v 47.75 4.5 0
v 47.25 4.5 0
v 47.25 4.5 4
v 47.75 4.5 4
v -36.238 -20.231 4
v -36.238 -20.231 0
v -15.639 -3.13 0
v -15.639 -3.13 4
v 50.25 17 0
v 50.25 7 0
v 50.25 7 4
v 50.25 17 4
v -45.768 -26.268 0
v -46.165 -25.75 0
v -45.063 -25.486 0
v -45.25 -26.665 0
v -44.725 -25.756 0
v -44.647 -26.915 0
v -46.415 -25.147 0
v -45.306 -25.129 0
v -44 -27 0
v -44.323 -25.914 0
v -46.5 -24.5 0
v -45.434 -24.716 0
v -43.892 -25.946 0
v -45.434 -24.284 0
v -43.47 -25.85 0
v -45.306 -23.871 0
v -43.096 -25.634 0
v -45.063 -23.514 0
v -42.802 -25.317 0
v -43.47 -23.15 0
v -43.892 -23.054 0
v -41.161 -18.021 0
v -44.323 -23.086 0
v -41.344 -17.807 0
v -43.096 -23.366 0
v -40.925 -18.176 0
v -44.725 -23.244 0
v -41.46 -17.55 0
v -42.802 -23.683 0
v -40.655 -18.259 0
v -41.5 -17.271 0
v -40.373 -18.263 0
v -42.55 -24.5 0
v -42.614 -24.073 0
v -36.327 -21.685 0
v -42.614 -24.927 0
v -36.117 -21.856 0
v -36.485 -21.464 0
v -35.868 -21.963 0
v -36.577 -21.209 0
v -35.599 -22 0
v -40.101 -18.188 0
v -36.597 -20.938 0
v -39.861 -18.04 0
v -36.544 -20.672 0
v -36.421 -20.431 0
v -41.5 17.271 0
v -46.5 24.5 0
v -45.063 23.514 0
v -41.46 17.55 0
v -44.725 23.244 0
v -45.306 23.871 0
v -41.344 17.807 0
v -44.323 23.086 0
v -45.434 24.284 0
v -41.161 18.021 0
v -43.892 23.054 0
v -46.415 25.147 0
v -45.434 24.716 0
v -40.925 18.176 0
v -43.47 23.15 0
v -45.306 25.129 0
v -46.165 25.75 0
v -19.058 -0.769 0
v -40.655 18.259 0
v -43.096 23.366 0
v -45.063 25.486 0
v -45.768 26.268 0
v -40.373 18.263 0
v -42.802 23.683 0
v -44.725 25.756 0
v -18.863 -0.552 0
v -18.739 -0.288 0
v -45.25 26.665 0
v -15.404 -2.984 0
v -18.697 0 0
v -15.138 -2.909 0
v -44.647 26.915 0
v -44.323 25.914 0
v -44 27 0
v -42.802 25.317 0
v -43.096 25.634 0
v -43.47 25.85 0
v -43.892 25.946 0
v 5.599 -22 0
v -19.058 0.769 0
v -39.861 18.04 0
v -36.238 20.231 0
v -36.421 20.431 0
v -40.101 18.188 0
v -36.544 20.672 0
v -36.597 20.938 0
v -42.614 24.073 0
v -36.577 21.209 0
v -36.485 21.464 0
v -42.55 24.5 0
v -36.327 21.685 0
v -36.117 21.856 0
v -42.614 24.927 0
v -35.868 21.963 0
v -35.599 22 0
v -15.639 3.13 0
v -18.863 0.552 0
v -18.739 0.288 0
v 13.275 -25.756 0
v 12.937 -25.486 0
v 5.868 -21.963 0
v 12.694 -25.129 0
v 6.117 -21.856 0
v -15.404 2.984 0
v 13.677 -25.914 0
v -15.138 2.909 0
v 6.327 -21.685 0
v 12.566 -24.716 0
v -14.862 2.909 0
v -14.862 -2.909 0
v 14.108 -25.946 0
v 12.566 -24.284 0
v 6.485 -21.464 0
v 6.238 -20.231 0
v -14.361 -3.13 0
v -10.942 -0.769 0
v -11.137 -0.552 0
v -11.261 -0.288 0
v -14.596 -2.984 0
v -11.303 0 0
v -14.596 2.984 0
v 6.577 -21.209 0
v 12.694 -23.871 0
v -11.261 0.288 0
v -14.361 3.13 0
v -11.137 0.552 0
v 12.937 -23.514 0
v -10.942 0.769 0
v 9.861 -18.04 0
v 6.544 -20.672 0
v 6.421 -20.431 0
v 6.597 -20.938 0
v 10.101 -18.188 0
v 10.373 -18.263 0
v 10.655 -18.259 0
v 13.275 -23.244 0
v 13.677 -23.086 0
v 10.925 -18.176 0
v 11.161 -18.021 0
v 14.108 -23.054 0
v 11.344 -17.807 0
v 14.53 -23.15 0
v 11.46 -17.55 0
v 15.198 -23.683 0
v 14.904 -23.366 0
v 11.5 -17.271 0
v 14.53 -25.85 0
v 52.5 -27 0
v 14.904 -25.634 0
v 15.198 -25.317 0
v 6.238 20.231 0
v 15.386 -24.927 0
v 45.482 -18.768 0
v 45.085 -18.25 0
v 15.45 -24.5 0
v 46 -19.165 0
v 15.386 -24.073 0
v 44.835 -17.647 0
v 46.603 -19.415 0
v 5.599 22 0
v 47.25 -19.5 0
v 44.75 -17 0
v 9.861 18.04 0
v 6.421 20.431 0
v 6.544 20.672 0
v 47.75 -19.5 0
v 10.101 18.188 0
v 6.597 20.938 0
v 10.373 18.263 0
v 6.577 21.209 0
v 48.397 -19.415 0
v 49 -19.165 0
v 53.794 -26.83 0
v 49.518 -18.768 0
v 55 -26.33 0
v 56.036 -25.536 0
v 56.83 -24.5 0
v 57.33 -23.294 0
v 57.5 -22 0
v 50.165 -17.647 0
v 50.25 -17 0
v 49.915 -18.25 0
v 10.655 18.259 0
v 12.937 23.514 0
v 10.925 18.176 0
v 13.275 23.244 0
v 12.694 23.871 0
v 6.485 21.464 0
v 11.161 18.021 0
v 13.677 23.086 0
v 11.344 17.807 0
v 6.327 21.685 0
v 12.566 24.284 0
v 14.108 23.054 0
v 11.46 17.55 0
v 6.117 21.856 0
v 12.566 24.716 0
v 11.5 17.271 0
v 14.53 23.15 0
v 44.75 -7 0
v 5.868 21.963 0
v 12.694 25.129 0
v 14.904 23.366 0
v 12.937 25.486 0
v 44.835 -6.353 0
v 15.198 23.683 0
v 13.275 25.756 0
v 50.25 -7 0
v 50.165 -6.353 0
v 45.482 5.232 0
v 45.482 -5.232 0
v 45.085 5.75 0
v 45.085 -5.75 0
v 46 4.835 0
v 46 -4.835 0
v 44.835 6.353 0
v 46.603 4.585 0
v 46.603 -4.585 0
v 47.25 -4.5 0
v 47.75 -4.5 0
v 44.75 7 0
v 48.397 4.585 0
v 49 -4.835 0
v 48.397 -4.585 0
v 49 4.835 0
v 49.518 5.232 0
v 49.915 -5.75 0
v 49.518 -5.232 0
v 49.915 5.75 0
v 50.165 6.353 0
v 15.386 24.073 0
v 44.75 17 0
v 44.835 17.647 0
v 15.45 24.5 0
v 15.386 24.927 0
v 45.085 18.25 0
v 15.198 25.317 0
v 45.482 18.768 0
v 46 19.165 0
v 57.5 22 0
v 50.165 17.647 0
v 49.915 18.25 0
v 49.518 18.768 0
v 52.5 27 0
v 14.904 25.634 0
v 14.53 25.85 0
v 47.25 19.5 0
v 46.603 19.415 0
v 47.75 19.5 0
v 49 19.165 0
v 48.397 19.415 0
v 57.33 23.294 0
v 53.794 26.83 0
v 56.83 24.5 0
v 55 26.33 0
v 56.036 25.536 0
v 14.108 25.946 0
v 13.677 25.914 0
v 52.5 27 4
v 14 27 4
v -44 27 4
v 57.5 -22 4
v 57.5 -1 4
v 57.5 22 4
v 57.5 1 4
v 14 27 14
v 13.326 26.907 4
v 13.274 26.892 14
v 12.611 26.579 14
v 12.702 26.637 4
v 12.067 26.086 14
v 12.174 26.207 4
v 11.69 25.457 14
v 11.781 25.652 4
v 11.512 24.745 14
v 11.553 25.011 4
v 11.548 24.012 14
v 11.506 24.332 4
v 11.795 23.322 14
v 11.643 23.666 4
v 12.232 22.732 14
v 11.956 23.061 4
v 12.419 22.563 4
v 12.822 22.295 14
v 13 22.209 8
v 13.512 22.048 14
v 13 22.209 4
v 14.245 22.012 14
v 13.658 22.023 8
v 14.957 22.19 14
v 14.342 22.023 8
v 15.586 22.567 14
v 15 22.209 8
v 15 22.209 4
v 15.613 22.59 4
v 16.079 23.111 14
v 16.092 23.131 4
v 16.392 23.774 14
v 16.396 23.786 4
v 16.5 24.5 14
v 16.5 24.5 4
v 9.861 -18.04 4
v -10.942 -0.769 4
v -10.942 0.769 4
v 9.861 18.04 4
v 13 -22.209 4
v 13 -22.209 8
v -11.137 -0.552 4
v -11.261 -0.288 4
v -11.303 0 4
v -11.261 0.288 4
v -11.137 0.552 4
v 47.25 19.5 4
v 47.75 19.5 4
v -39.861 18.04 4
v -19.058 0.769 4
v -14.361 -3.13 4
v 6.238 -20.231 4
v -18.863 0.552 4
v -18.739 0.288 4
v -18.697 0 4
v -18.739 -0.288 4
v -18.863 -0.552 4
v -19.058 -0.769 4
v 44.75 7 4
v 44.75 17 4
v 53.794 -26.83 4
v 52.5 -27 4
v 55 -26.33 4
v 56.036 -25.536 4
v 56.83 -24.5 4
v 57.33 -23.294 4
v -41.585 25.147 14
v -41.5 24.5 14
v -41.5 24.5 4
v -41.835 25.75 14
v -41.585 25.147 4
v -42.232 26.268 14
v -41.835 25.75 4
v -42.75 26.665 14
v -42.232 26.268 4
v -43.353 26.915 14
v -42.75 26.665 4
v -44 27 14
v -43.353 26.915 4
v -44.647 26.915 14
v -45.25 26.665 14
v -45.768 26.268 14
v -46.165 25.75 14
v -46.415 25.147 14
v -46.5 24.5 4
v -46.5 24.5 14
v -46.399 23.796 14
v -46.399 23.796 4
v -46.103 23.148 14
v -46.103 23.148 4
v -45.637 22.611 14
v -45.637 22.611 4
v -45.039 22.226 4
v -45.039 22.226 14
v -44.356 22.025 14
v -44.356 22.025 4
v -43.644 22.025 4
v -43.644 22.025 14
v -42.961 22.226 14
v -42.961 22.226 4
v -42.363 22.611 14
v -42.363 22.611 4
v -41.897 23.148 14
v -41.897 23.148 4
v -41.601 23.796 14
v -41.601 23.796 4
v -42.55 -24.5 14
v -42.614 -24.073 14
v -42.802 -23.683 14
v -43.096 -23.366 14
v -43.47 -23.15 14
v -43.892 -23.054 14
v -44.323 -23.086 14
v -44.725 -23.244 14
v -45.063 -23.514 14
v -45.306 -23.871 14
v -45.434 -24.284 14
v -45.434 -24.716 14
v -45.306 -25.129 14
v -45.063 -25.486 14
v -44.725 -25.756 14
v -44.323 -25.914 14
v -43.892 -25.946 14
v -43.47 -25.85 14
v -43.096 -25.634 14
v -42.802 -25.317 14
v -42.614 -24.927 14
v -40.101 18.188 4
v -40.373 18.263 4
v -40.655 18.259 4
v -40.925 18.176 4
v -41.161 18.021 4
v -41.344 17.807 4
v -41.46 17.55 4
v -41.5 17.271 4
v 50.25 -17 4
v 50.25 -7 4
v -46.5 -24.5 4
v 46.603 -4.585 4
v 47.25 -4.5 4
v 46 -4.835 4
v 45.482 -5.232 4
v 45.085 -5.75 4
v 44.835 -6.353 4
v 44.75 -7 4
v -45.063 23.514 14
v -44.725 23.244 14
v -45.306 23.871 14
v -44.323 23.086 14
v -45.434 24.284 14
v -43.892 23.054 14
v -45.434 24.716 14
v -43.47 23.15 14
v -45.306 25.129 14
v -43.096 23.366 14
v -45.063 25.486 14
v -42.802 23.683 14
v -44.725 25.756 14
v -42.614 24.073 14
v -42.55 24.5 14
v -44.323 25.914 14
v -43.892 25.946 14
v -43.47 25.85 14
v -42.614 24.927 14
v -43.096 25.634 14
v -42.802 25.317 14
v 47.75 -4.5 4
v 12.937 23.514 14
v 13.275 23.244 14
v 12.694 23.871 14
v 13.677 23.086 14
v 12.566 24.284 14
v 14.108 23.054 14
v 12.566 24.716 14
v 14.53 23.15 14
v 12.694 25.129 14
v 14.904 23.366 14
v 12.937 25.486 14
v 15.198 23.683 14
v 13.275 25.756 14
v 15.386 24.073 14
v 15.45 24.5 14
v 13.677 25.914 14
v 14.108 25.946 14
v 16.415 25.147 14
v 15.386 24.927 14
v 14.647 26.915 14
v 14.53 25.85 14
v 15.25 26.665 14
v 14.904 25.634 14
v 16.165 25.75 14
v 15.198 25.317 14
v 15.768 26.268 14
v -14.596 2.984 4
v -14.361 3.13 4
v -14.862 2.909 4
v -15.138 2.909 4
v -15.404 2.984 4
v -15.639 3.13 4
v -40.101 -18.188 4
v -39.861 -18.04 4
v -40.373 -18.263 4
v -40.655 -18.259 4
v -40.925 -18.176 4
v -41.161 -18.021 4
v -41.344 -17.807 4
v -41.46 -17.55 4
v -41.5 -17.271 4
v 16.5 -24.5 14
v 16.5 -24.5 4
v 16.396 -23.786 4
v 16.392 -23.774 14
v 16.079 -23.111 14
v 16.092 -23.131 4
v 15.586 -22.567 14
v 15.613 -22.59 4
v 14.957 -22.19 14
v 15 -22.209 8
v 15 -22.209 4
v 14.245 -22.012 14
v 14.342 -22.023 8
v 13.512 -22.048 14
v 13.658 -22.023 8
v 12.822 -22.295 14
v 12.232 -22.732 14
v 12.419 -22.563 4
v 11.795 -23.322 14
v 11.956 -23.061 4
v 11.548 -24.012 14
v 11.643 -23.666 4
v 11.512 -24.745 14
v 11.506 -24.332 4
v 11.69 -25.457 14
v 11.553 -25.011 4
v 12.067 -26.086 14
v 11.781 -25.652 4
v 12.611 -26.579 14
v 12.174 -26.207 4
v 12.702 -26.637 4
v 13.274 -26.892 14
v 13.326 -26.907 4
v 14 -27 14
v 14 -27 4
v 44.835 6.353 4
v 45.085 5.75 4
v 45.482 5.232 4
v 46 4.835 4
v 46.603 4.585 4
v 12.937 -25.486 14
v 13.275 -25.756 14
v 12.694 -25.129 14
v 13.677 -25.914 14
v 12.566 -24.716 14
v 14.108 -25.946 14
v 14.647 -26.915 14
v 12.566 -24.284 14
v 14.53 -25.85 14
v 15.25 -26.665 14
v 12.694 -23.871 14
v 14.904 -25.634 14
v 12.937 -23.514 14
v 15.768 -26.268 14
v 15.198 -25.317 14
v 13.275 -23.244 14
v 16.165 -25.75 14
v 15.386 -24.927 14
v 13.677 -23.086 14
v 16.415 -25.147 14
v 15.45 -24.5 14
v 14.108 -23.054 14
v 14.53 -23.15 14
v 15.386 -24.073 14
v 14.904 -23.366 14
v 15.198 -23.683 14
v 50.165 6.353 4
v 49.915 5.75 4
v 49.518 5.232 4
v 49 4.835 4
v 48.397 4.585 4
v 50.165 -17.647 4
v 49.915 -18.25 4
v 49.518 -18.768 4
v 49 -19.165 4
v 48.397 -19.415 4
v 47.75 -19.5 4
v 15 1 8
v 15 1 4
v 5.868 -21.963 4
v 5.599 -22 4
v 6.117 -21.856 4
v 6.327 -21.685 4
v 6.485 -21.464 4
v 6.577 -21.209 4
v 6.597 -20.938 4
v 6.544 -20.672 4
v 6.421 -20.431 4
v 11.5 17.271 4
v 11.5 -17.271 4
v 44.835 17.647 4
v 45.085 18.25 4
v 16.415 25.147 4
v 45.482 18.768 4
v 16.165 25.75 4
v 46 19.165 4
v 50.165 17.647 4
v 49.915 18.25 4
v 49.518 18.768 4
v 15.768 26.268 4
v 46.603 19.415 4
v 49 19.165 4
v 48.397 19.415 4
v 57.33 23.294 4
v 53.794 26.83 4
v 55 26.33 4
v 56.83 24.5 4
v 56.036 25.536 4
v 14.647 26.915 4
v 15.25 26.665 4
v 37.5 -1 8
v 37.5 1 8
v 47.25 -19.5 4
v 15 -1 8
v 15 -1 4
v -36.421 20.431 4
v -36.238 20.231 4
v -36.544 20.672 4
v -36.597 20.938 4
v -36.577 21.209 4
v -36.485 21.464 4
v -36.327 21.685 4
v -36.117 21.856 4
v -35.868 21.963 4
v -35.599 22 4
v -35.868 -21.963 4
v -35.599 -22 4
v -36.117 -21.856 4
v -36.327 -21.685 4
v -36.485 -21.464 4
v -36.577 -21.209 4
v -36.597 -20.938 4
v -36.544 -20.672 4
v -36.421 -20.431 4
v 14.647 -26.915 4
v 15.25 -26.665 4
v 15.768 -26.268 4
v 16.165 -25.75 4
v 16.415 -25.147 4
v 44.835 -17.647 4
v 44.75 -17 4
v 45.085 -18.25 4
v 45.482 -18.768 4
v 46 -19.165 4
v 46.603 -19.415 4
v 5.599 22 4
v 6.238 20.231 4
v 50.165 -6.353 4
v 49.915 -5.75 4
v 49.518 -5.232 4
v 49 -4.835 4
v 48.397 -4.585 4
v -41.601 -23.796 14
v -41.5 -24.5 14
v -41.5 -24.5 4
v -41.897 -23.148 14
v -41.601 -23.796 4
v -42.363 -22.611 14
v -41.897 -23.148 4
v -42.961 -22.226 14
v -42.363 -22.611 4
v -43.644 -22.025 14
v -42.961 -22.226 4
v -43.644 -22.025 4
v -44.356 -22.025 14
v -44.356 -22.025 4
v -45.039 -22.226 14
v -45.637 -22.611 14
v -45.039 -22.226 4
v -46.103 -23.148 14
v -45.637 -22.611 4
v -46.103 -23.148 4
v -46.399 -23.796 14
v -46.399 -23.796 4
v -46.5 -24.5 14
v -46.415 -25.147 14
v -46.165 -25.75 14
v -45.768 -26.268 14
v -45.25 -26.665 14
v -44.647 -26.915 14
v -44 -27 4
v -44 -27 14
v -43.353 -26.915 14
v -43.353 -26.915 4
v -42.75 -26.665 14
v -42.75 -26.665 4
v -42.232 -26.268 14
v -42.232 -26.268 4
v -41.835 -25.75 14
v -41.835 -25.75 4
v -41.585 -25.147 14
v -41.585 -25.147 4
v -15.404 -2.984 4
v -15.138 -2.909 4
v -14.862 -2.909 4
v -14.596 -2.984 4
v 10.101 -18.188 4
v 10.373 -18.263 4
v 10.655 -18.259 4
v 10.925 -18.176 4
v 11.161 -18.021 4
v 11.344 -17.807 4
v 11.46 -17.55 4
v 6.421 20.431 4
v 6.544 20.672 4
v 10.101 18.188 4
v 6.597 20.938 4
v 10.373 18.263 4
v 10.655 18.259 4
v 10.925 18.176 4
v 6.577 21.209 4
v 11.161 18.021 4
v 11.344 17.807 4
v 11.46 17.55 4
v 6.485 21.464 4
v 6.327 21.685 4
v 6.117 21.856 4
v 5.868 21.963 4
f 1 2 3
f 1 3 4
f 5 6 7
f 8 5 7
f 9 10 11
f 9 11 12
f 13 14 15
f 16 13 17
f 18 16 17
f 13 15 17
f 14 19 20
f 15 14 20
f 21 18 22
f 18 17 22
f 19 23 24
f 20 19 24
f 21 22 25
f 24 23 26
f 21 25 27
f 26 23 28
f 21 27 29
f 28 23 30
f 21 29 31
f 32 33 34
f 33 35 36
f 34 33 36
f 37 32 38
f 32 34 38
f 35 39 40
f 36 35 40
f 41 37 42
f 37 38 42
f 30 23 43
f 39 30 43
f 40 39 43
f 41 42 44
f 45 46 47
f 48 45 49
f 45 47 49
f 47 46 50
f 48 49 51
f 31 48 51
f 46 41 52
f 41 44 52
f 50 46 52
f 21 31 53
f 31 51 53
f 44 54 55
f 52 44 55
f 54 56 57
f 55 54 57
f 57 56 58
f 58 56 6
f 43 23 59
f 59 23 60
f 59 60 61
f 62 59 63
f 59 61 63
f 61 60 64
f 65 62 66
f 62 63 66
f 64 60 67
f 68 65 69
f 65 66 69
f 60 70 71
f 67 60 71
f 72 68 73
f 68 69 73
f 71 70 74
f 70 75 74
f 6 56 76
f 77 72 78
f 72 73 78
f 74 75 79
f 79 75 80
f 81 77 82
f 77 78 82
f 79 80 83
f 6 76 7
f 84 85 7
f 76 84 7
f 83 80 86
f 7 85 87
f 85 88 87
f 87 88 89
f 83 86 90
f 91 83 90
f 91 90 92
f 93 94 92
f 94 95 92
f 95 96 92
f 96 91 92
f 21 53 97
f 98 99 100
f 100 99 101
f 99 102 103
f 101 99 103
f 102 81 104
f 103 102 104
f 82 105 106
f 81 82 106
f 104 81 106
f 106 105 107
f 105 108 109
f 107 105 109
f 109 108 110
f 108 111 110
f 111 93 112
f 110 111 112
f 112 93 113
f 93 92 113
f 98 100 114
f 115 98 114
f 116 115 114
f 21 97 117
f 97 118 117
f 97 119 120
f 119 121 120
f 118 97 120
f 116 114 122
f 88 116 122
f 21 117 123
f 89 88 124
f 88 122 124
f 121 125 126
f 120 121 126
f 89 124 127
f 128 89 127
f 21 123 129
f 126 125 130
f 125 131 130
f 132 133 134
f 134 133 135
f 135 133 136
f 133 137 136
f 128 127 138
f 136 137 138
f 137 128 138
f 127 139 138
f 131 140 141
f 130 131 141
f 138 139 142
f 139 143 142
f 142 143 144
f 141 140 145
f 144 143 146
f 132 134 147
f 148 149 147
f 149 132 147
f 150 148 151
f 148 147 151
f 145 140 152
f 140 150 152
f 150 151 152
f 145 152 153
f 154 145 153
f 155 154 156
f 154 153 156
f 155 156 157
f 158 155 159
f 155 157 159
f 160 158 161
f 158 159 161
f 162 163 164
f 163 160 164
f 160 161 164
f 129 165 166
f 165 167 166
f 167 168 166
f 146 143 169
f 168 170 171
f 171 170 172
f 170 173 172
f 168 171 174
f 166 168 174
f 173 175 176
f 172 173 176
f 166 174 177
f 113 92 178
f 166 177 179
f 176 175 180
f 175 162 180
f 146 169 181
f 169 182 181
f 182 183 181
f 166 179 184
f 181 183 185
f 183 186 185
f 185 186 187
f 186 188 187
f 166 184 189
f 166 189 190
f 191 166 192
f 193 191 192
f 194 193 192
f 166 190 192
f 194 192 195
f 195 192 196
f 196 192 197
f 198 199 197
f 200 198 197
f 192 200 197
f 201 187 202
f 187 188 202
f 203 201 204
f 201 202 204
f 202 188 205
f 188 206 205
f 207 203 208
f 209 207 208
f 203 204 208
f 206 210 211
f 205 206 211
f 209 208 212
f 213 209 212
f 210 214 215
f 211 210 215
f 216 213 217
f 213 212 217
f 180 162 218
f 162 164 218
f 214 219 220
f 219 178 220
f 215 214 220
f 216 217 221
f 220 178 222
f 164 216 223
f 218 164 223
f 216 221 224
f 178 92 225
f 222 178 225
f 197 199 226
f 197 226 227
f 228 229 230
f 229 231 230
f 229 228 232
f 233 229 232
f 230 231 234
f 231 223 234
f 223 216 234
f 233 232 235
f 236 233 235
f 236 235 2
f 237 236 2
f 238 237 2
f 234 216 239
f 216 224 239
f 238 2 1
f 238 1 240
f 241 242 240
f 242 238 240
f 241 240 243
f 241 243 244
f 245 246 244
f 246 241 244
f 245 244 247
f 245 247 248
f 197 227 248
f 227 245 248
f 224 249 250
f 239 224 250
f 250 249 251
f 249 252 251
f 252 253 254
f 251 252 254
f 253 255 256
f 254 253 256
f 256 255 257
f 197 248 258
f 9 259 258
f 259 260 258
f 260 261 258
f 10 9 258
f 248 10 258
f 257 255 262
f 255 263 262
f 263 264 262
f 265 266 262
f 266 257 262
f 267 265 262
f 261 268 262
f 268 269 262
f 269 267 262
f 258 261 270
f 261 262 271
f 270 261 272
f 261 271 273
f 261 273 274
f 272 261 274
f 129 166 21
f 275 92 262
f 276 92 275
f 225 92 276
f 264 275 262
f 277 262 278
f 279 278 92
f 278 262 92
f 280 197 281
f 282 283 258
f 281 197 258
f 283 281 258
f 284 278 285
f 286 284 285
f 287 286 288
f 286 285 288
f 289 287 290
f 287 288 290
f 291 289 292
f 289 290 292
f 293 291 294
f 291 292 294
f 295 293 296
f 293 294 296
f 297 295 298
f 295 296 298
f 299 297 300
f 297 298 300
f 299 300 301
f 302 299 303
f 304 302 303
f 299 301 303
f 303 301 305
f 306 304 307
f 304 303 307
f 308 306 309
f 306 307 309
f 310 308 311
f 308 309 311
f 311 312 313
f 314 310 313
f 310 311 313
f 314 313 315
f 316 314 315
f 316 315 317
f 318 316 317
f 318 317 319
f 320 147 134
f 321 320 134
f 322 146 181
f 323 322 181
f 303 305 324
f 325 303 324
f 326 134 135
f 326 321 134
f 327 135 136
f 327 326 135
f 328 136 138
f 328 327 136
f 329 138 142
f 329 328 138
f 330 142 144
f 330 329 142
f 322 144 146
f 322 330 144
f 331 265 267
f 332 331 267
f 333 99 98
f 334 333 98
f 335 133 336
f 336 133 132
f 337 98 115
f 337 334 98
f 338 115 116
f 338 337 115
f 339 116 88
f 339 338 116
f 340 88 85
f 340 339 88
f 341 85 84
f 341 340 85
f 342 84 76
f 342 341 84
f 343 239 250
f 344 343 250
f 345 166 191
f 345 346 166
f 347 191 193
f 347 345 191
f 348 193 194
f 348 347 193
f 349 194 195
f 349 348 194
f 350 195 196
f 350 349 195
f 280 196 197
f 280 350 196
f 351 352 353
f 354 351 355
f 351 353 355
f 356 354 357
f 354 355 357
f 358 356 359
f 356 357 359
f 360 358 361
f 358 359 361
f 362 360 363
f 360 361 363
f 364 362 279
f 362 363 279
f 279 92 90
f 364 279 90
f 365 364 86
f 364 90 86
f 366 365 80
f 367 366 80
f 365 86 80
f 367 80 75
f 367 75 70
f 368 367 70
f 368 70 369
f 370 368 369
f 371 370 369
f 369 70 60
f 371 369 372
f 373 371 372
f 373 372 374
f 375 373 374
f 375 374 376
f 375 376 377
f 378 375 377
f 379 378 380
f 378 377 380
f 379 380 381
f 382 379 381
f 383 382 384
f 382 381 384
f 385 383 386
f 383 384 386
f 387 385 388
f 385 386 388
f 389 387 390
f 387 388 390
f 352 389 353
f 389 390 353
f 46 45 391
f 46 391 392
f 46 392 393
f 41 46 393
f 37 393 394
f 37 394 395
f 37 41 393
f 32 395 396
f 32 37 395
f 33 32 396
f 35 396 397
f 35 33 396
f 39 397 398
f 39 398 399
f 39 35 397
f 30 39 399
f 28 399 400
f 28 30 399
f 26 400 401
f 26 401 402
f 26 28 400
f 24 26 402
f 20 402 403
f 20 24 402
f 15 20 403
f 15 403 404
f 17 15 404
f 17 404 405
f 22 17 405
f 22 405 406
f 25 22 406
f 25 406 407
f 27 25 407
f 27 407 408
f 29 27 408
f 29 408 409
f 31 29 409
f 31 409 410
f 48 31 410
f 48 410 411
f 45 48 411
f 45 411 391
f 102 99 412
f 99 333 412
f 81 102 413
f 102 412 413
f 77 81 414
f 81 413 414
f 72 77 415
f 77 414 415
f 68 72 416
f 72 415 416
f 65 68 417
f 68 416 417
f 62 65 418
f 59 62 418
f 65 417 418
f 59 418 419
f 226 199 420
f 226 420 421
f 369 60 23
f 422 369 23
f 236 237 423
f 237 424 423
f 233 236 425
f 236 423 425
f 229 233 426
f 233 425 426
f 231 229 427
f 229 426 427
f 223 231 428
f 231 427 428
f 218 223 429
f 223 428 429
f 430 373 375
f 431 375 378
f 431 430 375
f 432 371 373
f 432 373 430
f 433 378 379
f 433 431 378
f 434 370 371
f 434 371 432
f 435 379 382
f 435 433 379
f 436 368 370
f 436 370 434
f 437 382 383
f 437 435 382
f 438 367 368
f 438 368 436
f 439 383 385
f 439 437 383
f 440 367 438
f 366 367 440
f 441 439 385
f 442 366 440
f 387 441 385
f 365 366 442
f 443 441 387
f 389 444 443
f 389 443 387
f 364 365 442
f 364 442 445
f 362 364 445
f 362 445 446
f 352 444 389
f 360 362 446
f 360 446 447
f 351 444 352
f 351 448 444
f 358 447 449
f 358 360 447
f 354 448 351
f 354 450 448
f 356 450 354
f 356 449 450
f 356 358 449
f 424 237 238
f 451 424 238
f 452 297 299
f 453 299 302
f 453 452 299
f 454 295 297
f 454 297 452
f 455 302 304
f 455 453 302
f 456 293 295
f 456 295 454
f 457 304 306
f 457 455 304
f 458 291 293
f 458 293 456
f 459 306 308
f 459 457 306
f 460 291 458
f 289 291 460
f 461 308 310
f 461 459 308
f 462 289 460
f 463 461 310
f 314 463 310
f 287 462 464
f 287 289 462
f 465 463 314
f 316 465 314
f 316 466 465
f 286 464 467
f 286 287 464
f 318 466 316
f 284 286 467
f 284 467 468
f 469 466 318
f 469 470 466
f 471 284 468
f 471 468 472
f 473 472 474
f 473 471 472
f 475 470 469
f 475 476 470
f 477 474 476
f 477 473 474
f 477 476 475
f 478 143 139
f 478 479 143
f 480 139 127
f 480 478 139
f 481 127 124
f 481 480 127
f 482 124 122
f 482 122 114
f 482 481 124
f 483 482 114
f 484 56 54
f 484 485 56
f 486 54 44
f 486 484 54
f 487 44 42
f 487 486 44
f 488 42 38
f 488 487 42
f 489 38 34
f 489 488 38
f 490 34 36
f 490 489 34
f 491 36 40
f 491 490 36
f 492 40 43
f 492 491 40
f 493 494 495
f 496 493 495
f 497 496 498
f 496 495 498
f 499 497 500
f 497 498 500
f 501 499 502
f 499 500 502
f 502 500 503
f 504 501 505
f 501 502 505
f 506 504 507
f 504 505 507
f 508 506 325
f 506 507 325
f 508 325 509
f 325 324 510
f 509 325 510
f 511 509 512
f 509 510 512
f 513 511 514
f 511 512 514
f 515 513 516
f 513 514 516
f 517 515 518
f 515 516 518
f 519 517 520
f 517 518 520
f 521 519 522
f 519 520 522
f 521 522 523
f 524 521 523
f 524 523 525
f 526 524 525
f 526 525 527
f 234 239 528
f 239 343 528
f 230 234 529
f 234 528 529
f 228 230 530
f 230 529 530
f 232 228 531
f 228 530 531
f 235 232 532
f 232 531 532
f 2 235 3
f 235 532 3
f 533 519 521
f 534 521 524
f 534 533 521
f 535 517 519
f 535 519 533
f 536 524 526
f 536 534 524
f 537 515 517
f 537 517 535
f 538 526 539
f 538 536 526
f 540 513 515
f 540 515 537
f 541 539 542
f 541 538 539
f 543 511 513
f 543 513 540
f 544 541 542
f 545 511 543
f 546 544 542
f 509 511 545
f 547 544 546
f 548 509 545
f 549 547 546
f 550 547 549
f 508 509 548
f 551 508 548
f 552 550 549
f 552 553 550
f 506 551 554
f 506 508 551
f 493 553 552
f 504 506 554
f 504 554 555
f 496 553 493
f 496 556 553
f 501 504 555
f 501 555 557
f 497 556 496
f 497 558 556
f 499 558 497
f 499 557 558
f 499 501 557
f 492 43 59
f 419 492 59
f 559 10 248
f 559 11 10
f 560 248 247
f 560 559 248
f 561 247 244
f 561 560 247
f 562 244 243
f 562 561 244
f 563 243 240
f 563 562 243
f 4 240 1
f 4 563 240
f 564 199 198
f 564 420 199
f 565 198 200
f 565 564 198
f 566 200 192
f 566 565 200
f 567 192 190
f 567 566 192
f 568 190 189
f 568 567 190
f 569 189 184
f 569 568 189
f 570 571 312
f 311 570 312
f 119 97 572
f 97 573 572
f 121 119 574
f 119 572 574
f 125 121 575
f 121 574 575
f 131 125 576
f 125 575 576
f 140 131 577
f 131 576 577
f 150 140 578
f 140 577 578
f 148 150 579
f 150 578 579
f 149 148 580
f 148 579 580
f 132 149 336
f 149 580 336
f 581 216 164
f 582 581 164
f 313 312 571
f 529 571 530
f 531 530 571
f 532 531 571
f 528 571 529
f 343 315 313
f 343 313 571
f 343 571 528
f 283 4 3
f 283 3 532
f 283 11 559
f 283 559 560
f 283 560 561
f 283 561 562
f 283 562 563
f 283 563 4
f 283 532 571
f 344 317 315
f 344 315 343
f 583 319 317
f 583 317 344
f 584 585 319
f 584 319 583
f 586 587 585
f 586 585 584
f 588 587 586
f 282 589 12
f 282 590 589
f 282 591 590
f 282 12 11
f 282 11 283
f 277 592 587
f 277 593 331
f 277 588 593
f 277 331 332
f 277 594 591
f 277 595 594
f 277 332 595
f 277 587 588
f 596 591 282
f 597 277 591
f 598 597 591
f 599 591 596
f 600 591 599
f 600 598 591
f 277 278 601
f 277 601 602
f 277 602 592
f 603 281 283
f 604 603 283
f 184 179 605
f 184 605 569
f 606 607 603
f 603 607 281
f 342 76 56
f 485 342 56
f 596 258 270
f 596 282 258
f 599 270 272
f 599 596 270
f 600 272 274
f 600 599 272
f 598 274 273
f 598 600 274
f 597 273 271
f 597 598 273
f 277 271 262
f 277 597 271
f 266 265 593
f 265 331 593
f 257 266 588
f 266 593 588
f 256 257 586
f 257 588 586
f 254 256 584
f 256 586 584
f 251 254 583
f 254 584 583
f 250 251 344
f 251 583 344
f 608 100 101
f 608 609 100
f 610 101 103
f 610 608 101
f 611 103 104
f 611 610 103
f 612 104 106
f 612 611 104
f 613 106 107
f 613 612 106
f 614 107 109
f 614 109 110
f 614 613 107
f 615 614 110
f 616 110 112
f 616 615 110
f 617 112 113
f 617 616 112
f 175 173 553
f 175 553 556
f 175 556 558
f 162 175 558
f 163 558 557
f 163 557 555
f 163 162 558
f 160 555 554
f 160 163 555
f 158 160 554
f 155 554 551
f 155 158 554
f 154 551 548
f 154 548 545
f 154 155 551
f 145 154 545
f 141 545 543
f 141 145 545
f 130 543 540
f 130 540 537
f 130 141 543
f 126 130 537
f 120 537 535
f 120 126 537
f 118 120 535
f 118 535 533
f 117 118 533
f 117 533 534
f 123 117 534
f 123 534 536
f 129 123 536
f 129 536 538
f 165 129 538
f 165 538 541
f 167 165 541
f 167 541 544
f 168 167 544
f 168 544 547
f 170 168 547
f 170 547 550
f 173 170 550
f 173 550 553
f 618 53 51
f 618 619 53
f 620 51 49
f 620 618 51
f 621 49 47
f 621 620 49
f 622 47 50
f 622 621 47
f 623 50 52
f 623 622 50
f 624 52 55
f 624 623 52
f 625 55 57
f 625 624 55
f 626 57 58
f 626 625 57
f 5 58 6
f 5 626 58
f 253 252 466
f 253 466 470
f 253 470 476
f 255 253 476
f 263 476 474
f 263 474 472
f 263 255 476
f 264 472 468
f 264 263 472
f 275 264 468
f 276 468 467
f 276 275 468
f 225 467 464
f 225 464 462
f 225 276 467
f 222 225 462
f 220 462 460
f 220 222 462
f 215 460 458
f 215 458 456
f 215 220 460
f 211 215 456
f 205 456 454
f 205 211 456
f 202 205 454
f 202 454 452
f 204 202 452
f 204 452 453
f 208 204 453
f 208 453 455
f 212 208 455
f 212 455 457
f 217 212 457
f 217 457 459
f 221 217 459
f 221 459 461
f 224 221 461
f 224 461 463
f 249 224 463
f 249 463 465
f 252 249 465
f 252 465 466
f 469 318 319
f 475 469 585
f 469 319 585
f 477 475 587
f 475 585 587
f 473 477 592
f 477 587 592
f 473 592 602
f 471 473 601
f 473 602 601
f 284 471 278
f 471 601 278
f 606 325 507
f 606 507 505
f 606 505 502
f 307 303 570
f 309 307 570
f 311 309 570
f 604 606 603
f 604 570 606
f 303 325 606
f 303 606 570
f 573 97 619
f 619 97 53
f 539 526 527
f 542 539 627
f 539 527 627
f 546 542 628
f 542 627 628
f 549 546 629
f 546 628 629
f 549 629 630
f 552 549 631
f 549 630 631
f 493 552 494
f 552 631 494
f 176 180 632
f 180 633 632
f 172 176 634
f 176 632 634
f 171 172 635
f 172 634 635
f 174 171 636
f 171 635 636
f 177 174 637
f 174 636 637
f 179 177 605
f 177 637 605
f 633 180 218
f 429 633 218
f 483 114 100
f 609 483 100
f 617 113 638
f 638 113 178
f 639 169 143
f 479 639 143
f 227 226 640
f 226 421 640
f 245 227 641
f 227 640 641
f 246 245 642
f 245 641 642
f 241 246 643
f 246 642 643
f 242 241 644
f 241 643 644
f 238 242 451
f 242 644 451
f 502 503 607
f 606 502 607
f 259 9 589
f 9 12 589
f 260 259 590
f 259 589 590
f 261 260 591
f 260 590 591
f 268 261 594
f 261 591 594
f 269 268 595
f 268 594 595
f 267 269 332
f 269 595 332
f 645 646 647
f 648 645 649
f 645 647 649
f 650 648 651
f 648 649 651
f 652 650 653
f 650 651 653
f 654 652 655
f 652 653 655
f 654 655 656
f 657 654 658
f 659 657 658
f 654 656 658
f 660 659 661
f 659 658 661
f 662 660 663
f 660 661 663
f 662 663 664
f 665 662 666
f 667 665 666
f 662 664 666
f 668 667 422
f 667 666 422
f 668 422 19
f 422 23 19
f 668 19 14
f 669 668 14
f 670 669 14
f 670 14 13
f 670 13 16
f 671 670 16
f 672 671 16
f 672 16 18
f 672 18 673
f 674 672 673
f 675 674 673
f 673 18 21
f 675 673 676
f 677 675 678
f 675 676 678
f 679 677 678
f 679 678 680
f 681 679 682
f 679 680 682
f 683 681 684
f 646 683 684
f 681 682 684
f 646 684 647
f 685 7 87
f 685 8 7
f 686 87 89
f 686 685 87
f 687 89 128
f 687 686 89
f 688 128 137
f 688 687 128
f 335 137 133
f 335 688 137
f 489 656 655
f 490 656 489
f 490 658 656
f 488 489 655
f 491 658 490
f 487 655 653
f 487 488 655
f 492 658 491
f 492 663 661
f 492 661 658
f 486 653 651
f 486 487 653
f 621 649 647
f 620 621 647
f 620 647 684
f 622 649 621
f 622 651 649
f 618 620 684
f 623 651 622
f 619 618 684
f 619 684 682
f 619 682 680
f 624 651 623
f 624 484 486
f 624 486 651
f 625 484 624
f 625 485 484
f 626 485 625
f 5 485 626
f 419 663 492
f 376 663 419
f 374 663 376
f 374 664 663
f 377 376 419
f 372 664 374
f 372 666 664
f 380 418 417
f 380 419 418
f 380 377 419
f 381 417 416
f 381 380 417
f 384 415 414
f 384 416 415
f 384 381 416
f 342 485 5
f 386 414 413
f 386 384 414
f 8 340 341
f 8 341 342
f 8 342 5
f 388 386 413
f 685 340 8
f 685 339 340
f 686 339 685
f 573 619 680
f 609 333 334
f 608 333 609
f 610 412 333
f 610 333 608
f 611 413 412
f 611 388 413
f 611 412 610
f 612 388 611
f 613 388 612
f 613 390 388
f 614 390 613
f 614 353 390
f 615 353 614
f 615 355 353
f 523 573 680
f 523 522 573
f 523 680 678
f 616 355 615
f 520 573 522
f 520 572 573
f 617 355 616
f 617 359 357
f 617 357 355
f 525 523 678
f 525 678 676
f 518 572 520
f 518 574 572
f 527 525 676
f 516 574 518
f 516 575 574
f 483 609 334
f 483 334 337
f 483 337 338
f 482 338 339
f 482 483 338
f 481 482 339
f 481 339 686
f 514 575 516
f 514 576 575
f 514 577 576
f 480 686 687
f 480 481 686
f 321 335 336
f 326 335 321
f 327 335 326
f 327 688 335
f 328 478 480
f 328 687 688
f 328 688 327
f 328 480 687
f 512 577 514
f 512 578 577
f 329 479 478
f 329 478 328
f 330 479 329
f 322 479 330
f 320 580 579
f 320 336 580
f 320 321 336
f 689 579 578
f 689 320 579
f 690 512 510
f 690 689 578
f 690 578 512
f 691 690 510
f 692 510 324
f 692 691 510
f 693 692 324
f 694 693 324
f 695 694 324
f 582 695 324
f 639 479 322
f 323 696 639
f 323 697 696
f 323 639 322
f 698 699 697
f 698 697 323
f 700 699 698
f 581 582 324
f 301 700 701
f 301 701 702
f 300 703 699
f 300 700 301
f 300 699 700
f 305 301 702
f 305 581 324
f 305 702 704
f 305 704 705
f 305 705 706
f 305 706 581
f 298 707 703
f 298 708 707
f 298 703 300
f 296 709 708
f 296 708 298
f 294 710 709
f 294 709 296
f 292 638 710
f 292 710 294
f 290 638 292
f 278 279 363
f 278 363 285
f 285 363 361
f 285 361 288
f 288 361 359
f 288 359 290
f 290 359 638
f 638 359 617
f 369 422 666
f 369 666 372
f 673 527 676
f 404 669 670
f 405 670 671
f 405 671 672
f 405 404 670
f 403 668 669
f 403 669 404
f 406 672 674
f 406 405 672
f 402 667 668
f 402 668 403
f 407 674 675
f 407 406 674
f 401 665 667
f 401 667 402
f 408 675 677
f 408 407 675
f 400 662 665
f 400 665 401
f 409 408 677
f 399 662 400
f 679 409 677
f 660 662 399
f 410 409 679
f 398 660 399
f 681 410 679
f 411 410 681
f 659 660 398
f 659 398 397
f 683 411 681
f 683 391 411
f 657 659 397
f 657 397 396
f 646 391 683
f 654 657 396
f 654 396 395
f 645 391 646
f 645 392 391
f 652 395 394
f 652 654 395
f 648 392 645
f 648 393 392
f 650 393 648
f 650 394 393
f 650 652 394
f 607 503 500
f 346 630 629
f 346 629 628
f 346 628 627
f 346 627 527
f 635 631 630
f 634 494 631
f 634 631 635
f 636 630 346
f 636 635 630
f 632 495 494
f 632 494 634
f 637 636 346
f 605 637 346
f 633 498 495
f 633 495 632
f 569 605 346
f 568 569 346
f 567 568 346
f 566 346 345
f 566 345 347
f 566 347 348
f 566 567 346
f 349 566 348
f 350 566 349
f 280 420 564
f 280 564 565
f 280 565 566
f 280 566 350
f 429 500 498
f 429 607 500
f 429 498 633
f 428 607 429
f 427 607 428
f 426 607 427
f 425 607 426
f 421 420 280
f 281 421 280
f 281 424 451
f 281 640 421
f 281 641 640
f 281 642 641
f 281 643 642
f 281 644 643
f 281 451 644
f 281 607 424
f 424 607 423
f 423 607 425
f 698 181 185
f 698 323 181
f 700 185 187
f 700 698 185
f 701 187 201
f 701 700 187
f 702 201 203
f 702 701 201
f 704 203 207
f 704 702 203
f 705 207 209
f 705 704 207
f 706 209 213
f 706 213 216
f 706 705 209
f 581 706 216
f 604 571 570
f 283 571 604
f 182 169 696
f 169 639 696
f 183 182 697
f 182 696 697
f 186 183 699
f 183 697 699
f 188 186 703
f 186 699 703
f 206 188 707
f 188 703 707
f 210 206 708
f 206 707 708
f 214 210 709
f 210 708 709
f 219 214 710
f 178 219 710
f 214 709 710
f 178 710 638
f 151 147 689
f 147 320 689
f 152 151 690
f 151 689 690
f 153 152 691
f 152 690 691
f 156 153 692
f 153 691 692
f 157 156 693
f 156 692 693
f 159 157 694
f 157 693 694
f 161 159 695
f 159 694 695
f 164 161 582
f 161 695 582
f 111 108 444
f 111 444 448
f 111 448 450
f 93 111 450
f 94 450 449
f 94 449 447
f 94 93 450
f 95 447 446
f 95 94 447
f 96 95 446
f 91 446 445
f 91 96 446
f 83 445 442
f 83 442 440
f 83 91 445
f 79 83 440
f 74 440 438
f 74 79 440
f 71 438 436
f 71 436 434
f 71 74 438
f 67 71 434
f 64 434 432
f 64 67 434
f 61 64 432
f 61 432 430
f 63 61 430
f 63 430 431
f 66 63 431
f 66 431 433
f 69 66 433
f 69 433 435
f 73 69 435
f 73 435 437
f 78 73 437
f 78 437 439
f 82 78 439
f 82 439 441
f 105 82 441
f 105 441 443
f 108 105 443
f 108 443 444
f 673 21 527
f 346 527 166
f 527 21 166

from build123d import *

# Parameters (mm, degrees)
F1_W     = 5.5
F1_H     = 15
F1_R     = 1.45
F2_DEPTH = 4
F3_DEPTH = 14
F4_R     = 2.5
F5_R     = 5
F6_W     = 42.5
F6_H     = 2
F7_DEPTH = 4
F8_SIZE2 = 4
F8_SIZE  = 20
F9_R     = 1


with BuildPart() as f2:
    # F1 (on Top) → F2 (new body)
    with BuildSketch(Plane.XY):
        with BuildLine():
            ThreePointArc((-44, 27), (-42.232233047, 26.267766953), (-41.5, 24.5))
            ThreePointArc((-41.5, 24.5), (-44, 22), (-46.5, 24.5))
            Line((-46.5, 24.5), (-46.5, -24.5))
            ThreePointArc((-46.5, -24.5), (-44, -22), (-41.5, -24.5))
            ThreePointArc((-41.5, -24.5), (-42.232233047, -26.267766953), (-44, -27))
            Line((-44, -27), (14, -27))
            Line((14, -27), (16.5, -27))
            Line((16.5, -27), (57.5, -27))
            Line((57.5, -27), (57.5, 27))
            Line((57.5, 27), (16.5, 27))
            Line((16.5, 27), (14, 27))
            Line((14, 27), (-44, 27))
        make_face()
        with BuildLine():
            ThreePointArc((16.5, -24.5), (15.767766953, -26.267766953), (14, -27))
            ThreePointArc((14, -27), (12.232233047, -22.732233047), (16.5, -24.5))
        make_face(mode=Mode.SUBTRACT)
        with Locations((47.5, -12)):
            Rectangle(F1_W, F1_H, mode=Mode.SUBTRACT)
        Polygon((11.5, -19.400605268), (11.5, -22), (8.368910891, -22), (-38.368910891, -22), (-41.5, -22), (-41.5, -19.400605268), (-41.5, 19.400605268), (-41.5, 22), (-38.368910891, 22), (8.368910891, 22), (11.5, 22), (11.5, 19.400605268), align=None, mode=Mode.SUBTRACT)
        with Locations((47.5, 12)):
            Rectangle(F1_W, F1_H, mode=Mode.SUBTRACT)
        with BuildLine():
            ThreePointArc((16.5, 24.5), (12.232233047, 22.732233047), (14, 27))
            ThreePointArc((14, 27), (15.767766953, 26.267766953), (16.5, 24.5))
        make_face(mode=Mode.SUBTRACT)
        Polygon((-41.5, 19.400605268), (-18.131089109, 0), (-15, 2.599394732), (-38.368910891, 22), (-41.5, 22), align=None)
        Polygon((-11.868910891, 0), (11.5, 19.400605268), (11.5, 22), (8.368910891, 22), (-15, 2.599394732), align=None)
        Polygon((8.368910891, -22), (11.5, -22), (11.5, -19.400605268), (-11.868910891, 0), (-15, -2.599394732), align=None)
        Polygon((-41.5, -22), (-38.368910891, -22), (-15, -2.599394732), (-18.131089109, 0), (-41.5, -19.400605268), align=None)
        with BuildLine():
            ThreePointArc((16.5, 24.5), (15.767766953, 26.267766953), (14, 27))
            ThreePointArc((14, 27), (12.232233047, 22.732233047), (16.5, 24.5))
        make_face()
        with Locations((14, 24.5)):
            Circle(F1_R, mode=Mode.SUBTRACT)
        with BuildLine():
            ThreePointArc((16.5, -24.5), (12.232233047, -22.732233047), (14, -27))
            ThreePointArc((14, -27), (15.767766953, -26.267766953), (16.5, -24.5))
        make_face()
        with Locations((14, -24.5)):
            Circle(F1_R, mode=Mode.SUBTRACT)
        with BuildLine():
            ThreePointArc((-46.5, 24.5), (-44, 22), (-41.5, 24.5))
            ThreePointArc((-41.5, 24.5), (-42.232233047, 26.267766953), (-44, 27))
            ThreePointArc((-44, 27), (-45.767766953, 26.267766953), (-46.5, 24.5))
        make_face()
        with Locations((-44, 24.5)):
            Circle(F1_R, mode=Mode.SUBTRACT)
        with BuildLine():
            ThreePointArc((-41.5, -24.5), (-44, -22), (-46.5, -24.5))
            ThreePointArc((-46.5, -24.5), (-45.767766953, -26.267766953), (-44, -27))
            ThreePointArc((-44, -27), (-42.232233047, -26.267766953), (-41.5, -24.5))
        make_face()
        with Locations((-44, -24.5)):
            Circle(F1_R, mode=Mode.SUBTRACT)
        Polygon((-18.131089109, 0), (-15, -2.599394732), (-11.868910891, 0), (-15, 2.599394732), align=None)
    extrude(amount=F2_DEPTH)

    # F1 (on Top) → F3 (join)
    with BuildSketch(Plane.XY):
        with BuildLine():
            ThreePointArc((-46.5, 24.5), (-44, 22), (-41.5, 24.5))
            ThreePointArc((-41.5, 24.5), (-42.232233047, 26.267766953), (-44, 27))
            ThreePointArc((-44, 27), (-45.767766953, 26.267766953), (-46.5, 24.5))
        make_face()
        with Locations((-44, 24.5)):
            Circle(F1_R, mode=Mode.SUBTRACT)
        with BuildLine():
            ThreePointArc((16.5, 24.5), (15.767766953, 26.267766953), (14, 27))
            ThreePointArc((14, 27), (12.232233047, 22.732233047), (16.5, 24.5))
        make_face()
        with Locations((14, 24.5)):
            Circle(F1_R, mode=Mode.SUBTRACT)
        with BuildLine():
            ThreePointArc((16.5, -24.5), (12.232233047, -22.732233047), (14, -27))
            ThreePointArc((14, -27), (15.767766953, -26.267766953), (16.5, -24.5))
        make_face()
        with Locations((14, -24.5)):
            Circle(F1_R, mode=Mode.SUBTRACT)
        with BuildLine():
            ThreePointArc((-41.5, -24.5), (-44, -22), (-46.5, -24.5))
            ThreePointArc((-46.5, -24.5), (-45.767766953, -26.267766953), (-44, -27))
            ThreePointArc((-44, -27), (-42.232233047, -26.267766953), (-41.5, -24.5))
        make_face()
        with Locations((-44, -24.5)):
            Circle(F1_R, mode=Mode.SUBTRACT)
    extrude(amount=F3_DEPTH)

    # F4
    f4_edges = [f2.edges().sort_by_distance(p)[0] for p in [
        (44.75, 19.5, 2),
        (50.25, 19.5, 2),
        (50.25, 4.5, 2),
        (44.75, 4.5, 2),
        (44.75, -19.5, 2),
        (50.25, -19.5, 2),
        (50.25, -4.5, 2),
        (44.75, -4.5, 2),
    ]]
    fillet(f4_edges, radius=F4_R)

    # F5
    f5_edges = [f2.edges().sort_by_distance(p)[0] for p in [
        (57.5, -27, 2),
        (57.5, 27, 2),
    ]]
    fillet(f5_edges, radius=F5_R)

    # F6 (on face) → F7 (join)
    with BuildSketch(Plane.XY.offset(4)):
        with BuildLine():
            ThreePointArc((15, 22.2087121525), (14, 22), (13, 22.2087121525))
            Line((13, 22.2087121525), (13, -22.2087121525))
            ThreePointArc((13, -22.2087121525), (14, -22), (15, -22.2087121525))
            Line((15, -22.2087121525), (15, -1))
            Line((15, -1), (15, 1))
            Line((15, 1), (15, 22.2087121525))
        make_face()
        with Locations((36.25, 0)):
            Rectangle(F6_W, F6_H)
    extrude(amount=F7_DEPTH)

    # F8
    f8_edges = [f2.edges().sort_by_distance(p)[0] for p in [
        (57.5, 0, 8),
    ]]
    f8_side = f2.faces().sort_by_distance((24.914828, 0, 8))[0]
    chamfer(f8_edges, length=F8_SIZE, length2=F8_SIZE2, reference=f8_side)

    # F9
    f9_edges = [f2.edges().sort_by_distance(p)[0] for p in [
        (-41.5, 19.400605, 2),
        (-38.368911, 22, 2),
        (8.368911, 22, 2),
        (11.5, 19.400605, 2),
        (11.5, -19.400605, 2),
        (8.368911, -22, 2),
        (-38.368911, -22, 2),
        (-41.5, -19.400605, 2),
        (-18.131089, 0, 2),
        (-15, -2.599395, 2),
        (-11.868911, 0, 2),
        (-15, 2.599395, 2),
    ]]
    fillet(f9_edges, radius=F9_R)


solid = f2.part
